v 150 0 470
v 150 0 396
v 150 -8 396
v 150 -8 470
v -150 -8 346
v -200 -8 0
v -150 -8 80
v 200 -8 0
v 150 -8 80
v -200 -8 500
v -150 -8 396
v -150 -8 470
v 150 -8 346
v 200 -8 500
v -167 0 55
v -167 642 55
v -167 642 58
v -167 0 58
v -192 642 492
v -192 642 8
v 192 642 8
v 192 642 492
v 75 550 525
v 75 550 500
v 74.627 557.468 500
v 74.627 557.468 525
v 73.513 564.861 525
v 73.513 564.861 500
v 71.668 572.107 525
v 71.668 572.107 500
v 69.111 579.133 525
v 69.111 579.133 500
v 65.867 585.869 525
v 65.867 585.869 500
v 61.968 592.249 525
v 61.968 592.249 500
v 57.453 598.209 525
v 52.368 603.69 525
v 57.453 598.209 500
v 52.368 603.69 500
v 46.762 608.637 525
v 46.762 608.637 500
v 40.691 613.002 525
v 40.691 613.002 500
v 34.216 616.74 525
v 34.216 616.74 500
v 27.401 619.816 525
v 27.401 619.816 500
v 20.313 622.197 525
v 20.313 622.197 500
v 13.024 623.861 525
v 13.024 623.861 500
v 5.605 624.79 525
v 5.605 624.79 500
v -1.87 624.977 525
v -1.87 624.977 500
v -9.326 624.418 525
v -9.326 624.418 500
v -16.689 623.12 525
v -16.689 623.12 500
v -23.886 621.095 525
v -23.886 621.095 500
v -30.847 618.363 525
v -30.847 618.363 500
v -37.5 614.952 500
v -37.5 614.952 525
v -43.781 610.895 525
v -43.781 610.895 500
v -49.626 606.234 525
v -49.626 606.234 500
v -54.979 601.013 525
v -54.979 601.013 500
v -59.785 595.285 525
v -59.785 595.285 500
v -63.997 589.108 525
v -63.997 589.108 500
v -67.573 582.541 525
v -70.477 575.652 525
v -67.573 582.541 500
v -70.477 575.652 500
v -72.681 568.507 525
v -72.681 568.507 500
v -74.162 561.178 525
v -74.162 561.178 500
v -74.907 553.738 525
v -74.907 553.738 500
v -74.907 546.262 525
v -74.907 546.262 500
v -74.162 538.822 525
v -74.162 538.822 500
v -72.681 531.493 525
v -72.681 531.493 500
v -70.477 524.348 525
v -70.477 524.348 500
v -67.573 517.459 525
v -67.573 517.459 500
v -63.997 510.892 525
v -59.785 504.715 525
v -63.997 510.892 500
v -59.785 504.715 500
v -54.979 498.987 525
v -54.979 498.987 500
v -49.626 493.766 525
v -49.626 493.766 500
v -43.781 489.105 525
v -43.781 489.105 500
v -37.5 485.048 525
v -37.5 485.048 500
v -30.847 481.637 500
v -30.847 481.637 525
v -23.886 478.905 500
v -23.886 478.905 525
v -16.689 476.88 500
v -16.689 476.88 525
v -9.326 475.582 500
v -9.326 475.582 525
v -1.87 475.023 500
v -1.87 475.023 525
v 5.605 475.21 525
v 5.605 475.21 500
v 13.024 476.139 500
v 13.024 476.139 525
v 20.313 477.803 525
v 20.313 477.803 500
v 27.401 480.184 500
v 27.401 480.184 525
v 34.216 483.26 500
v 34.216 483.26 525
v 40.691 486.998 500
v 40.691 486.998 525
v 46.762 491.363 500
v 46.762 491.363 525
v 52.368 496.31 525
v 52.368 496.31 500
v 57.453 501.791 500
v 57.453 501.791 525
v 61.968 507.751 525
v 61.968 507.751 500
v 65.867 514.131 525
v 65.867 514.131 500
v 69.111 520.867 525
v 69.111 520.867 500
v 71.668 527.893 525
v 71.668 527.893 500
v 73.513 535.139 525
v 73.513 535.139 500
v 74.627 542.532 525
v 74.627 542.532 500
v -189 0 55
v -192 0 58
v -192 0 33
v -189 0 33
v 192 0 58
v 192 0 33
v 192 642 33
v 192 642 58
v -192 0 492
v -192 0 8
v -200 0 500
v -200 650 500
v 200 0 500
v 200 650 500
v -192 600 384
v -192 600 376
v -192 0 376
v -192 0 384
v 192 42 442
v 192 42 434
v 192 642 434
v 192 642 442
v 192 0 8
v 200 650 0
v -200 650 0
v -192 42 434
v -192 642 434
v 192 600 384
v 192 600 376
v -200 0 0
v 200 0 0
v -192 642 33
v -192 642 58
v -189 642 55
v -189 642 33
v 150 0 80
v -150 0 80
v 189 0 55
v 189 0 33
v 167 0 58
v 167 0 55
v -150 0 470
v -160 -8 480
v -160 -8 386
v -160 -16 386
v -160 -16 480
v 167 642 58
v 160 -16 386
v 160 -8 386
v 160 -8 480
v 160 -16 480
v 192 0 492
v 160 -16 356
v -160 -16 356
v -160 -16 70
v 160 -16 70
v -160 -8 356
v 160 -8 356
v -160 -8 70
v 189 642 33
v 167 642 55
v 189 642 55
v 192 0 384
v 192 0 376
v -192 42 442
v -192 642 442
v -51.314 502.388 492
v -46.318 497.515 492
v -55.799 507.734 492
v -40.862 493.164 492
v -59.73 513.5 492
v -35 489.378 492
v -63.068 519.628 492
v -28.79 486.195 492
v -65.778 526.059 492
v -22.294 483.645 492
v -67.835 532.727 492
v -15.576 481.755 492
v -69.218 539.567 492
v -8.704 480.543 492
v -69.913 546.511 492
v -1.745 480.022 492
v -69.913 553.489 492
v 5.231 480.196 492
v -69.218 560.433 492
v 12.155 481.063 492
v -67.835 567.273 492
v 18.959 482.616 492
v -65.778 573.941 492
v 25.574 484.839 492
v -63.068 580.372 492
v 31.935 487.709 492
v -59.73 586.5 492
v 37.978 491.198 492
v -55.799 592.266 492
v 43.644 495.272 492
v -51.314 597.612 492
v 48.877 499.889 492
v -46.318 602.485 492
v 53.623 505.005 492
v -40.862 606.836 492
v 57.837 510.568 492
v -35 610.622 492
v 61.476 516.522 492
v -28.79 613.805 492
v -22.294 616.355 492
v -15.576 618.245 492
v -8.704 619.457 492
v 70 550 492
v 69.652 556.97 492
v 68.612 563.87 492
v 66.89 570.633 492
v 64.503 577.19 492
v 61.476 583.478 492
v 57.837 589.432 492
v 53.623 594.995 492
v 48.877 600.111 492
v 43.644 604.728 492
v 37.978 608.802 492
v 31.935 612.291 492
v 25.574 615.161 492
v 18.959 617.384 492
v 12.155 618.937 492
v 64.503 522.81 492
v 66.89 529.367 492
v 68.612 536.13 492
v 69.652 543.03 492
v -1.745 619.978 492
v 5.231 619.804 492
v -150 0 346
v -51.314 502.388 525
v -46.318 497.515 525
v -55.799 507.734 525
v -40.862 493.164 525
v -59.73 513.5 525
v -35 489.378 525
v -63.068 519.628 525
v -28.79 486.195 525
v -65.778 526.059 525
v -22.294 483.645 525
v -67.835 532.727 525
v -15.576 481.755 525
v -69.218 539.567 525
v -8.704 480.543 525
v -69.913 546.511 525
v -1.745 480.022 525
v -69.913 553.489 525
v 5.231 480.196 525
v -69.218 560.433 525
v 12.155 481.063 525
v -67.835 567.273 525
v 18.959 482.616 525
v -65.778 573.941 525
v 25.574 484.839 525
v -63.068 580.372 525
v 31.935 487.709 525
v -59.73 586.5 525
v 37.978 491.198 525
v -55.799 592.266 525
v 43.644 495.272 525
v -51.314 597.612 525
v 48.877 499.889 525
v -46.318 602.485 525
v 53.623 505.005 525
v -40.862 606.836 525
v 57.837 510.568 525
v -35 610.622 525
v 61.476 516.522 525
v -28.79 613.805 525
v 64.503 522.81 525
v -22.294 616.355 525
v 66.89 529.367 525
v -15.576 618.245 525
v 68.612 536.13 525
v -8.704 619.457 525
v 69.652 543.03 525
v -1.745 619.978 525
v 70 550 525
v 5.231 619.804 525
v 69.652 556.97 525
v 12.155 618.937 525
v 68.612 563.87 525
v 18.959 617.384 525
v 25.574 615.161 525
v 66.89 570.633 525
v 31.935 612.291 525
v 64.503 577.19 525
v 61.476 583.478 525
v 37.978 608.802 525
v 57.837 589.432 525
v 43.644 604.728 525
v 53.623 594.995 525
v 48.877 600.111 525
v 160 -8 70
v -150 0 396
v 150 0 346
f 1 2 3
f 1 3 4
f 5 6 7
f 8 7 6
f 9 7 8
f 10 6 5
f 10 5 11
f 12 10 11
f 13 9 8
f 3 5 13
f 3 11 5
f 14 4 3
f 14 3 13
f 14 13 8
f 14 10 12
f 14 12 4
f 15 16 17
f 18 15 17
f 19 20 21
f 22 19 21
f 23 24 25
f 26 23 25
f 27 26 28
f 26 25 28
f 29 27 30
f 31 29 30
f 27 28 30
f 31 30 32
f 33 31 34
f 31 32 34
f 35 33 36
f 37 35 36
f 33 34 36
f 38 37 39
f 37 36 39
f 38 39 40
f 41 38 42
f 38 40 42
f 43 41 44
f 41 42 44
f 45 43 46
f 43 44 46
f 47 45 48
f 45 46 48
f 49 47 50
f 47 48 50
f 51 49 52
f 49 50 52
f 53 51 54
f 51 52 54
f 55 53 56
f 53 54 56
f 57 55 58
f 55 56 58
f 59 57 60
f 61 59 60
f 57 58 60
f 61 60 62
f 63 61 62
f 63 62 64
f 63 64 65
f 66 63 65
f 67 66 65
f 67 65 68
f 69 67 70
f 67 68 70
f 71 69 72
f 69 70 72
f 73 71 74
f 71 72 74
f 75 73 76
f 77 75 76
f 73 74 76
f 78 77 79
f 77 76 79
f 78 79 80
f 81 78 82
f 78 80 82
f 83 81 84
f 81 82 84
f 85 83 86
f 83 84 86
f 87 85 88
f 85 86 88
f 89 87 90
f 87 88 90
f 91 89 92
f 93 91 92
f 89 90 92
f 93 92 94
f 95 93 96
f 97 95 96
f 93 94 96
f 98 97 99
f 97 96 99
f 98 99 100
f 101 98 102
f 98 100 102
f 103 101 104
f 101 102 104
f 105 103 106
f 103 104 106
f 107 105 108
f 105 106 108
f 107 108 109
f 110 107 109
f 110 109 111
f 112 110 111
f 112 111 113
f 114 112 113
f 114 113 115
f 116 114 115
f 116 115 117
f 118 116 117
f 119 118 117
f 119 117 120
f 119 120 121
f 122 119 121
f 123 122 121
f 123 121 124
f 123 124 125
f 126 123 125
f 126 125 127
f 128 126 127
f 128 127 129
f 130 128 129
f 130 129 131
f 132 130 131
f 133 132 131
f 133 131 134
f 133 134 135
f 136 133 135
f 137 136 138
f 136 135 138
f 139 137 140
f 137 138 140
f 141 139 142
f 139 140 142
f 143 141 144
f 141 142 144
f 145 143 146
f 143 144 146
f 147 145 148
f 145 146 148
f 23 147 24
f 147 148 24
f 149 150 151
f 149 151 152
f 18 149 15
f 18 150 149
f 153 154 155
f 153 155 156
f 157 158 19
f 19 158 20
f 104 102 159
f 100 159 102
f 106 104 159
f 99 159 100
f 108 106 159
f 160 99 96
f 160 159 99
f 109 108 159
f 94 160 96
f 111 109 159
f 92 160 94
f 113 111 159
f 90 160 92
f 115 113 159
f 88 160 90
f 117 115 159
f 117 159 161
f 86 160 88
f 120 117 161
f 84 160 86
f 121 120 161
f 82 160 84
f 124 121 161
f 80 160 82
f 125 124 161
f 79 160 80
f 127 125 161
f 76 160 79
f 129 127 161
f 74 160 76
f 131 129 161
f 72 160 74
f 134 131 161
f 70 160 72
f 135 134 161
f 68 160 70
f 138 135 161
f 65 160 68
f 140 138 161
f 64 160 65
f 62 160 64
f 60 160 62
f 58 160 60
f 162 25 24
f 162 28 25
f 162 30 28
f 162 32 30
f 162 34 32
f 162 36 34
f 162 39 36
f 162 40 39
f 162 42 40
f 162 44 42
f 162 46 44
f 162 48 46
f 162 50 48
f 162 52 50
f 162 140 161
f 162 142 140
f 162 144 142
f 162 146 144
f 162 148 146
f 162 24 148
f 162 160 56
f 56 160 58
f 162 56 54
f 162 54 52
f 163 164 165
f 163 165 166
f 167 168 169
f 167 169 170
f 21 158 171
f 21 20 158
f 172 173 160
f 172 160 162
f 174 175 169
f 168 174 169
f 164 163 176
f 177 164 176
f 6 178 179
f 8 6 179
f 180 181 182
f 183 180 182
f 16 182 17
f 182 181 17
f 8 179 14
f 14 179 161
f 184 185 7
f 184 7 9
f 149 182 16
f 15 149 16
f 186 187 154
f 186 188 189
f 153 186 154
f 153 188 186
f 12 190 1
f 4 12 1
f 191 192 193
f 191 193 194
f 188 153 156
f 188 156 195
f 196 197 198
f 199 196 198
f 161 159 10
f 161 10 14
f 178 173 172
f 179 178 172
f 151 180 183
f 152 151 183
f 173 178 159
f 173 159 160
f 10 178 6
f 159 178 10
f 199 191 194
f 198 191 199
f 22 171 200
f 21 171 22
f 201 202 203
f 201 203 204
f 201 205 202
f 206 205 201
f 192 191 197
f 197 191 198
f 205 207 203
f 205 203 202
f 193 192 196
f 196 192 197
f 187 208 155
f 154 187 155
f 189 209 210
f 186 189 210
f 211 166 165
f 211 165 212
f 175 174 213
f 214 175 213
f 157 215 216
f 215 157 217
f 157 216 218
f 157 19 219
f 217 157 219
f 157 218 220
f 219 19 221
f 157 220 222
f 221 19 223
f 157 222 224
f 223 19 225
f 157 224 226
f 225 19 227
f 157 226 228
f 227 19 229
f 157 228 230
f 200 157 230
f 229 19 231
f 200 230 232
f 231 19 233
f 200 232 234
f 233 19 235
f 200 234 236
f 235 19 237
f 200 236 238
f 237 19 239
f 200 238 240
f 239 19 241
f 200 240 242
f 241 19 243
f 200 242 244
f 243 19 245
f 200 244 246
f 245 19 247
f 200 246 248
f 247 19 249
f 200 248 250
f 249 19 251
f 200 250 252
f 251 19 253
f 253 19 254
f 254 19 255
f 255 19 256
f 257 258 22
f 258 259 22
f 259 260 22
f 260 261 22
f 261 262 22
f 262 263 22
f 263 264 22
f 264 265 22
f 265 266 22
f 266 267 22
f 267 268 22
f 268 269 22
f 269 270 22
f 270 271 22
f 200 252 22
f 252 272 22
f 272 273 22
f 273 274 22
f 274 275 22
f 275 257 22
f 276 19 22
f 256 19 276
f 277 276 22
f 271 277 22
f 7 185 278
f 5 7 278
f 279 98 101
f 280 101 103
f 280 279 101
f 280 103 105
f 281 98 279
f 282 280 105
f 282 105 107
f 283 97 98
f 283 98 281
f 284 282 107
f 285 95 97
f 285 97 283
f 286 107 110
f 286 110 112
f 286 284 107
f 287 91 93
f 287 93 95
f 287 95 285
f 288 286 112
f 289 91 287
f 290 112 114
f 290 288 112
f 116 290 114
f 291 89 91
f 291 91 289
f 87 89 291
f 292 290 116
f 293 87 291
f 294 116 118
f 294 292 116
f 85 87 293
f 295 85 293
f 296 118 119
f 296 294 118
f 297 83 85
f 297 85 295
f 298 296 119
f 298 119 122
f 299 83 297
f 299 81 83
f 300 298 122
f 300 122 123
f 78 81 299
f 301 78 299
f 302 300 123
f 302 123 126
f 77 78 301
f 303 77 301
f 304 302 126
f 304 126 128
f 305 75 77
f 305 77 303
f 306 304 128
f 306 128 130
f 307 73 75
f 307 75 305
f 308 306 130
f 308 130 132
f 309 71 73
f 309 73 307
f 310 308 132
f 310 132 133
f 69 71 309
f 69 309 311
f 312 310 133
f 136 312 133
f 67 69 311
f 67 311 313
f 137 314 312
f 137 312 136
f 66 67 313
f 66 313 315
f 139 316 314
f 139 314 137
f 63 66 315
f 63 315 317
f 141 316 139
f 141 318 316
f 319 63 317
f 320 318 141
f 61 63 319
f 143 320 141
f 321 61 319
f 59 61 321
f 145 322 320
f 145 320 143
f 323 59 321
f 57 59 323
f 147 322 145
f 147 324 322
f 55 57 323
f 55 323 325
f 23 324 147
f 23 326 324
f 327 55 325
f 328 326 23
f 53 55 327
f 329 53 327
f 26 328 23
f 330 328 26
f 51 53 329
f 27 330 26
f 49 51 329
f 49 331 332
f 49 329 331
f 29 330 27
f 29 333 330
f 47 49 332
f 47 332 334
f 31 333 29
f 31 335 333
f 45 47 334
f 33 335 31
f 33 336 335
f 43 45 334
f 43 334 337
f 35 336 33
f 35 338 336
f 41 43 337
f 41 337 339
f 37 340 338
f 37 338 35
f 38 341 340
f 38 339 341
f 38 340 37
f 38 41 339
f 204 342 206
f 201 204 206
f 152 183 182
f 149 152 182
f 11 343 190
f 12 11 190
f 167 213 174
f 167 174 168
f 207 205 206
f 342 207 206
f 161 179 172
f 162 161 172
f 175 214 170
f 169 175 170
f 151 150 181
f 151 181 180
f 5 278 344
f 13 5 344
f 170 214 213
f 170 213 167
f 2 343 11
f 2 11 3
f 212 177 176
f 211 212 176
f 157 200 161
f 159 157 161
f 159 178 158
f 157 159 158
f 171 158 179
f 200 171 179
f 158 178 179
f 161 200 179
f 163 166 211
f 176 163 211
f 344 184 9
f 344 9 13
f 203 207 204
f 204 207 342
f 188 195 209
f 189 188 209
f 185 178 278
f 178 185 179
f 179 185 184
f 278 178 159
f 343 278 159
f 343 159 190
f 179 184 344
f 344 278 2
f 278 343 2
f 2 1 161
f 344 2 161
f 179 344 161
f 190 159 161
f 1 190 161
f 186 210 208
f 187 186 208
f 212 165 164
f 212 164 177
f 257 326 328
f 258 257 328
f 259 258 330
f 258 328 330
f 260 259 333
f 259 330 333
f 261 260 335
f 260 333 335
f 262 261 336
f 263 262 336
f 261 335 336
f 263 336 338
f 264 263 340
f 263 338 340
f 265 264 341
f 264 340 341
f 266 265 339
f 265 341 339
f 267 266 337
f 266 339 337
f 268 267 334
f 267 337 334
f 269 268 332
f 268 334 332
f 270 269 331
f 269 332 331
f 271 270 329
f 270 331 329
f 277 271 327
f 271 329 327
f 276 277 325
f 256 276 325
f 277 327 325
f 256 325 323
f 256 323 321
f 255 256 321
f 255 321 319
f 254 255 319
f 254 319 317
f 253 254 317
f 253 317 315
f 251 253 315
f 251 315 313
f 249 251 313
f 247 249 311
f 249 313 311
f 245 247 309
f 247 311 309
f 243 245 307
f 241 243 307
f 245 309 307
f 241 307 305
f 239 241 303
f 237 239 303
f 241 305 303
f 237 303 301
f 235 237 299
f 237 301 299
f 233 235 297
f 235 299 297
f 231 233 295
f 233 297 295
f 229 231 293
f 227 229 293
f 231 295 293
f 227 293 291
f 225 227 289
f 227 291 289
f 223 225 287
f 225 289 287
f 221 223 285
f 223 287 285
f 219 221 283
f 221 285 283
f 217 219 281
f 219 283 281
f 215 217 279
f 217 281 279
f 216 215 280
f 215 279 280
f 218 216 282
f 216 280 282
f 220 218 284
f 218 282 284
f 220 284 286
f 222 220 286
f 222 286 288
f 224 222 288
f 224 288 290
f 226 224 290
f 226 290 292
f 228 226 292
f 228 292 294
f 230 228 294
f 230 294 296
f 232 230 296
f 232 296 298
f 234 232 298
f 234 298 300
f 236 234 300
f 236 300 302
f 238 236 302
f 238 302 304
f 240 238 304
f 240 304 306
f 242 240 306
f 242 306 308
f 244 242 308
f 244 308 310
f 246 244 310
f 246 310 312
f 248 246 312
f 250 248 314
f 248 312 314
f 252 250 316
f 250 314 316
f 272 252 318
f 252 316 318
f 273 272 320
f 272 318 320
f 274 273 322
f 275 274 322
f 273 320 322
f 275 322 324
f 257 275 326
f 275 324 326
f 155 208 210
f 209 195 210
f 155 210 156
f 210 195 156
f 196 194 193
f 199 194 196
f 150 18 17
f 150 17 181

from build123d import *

# Parameters (mm, degrees)
F1_W      = 400
F1_H      = 650
F2_DEPTH  = 500
F3_T      = -8
F4_W      = 384
F4_H      = 8
F5_DEPTH  = 600
F6_W      = 384
F6_H      = 8
F7_DEPTH  = 600
F9_DEPTH  = 642
F10_R     = 75
F11_DEPTH = 25
F12_R     = 70
F13_DEPTH = 33
F14_W     = 400
F14_H     = 500
F14_W_2   = 300
F14_H_2   = 266
F14_H_3   = 74
F15_DEPTH = 8
F16_W     = 320
F16_H     = 94
F17_DEPTH = 8
F16_H_2   = 286


with BuildPart() as f2:
    # F1 (on Top) → F2 (new body)
    with BuildSketch(Plane.XY):
        with Locations((0, 325)):
            Rectangle(F1_W, F1_H)
    extrude(amount=F2_DEPTH)

    # F3
    f3_openings = [f2.faces().sort_by_distance(p)[0] for p in [
        (0, 0, 250),
    ]]
    offset(amount=F3_T, openings=f3_openings)

    # F10 (on face) → F11 (join)
    with BuildSketch(Plane.XY.offset(500)):
        with Locations((0, 550)):
            Circle(F10_R)
    extrude(amount=F11_DEPTH)

    # F12 (on face) → F13 (cut, through all)
    with BuildSketch(Plane.XY.offset(525)):
        with Locations((0, 550)):
            Circle(F12_R)
    extrude(amount=-F13_DEPTH, mode=Mode.SUBTRACT)


with BuildPart() as f5:
    # F4 (on face) → F5 (new body)
    with BuildSketch(Plane.XZ.offset(-642)):
        with Locations((0, 438)):
            Rectangle(F4_W, F4_H)
    extrude(amount=F5_DEPTH)


with BuildPart() as f7:
    # F6 (on face) → F7 (new body)
    with BuildSketch(Plane.XZ):
        with Locations((0, 380)):
            Rectangle(F6_W, F6_H)
    extrude(amount=-F7_DEPTH)


with BuildPart() as f9:
    # F8 (on face) → F9 (new body, through all)
    with BuildSketch(Plane.XZ.offset(-642)):
        Polygon((-167, 55), (-167, 58), (-192, 58), (-192, 33), (-189, 33), (-189, 55), align=None)
    extrude(amount=F9_DEPTH)


with BuildPart() as f9b:
    # F8 (on face) → F9, piece 2 (new body, through all)
    with BuildSketch(Plane.XZ.offset(-642)):
        Polygon((189, 33), (192, 33), (192, 58), (167, 58), (167, 55), (189, 55), align=None)
    extrude(amount=F9_DEPTH)


with BuildPart() as f15:
    # F14 (on face) → F15 (new body)
    with BuildSketch(Plane.XZ):
        with Locations((0, 250)):
            Rectangle(F14_W, F14_H)
        with Locations((0, 213)):
            Rectangle(F14_W_2, F14_H_2, mode=Mode.SUBTRACT)
        with Locations((0, 433)):
            Rectangle(F14_W_2, F14_H_3, mode=Mode.SUBTRACT)
    extrude(amount=F15_DEPTH)


with BuildPart() as f17:
    # F16 (on face) → F17 (new body)
    with BuildSketch(Plane.XZ.offset(8)):
        with Locations((0, 433)):
            Rectangle(F16_W, F16_H)
    extrude(amount=F17_DEPTH)


with BuildPart() as f17b:
    # F16 (on face) → F17, piece 2 (new body)
    with BuildSketch(Plane.XZ.offset(8)):
        with Locations((0, 213)):
            Rectangle(F16_W, F16_H_2)
    extrude(amount=F17_DEPTH)


solid = Compound([f2.part, f5.part, f7.part, f9.part, f9b.part, f15.part, f17.part, f17b.part])
